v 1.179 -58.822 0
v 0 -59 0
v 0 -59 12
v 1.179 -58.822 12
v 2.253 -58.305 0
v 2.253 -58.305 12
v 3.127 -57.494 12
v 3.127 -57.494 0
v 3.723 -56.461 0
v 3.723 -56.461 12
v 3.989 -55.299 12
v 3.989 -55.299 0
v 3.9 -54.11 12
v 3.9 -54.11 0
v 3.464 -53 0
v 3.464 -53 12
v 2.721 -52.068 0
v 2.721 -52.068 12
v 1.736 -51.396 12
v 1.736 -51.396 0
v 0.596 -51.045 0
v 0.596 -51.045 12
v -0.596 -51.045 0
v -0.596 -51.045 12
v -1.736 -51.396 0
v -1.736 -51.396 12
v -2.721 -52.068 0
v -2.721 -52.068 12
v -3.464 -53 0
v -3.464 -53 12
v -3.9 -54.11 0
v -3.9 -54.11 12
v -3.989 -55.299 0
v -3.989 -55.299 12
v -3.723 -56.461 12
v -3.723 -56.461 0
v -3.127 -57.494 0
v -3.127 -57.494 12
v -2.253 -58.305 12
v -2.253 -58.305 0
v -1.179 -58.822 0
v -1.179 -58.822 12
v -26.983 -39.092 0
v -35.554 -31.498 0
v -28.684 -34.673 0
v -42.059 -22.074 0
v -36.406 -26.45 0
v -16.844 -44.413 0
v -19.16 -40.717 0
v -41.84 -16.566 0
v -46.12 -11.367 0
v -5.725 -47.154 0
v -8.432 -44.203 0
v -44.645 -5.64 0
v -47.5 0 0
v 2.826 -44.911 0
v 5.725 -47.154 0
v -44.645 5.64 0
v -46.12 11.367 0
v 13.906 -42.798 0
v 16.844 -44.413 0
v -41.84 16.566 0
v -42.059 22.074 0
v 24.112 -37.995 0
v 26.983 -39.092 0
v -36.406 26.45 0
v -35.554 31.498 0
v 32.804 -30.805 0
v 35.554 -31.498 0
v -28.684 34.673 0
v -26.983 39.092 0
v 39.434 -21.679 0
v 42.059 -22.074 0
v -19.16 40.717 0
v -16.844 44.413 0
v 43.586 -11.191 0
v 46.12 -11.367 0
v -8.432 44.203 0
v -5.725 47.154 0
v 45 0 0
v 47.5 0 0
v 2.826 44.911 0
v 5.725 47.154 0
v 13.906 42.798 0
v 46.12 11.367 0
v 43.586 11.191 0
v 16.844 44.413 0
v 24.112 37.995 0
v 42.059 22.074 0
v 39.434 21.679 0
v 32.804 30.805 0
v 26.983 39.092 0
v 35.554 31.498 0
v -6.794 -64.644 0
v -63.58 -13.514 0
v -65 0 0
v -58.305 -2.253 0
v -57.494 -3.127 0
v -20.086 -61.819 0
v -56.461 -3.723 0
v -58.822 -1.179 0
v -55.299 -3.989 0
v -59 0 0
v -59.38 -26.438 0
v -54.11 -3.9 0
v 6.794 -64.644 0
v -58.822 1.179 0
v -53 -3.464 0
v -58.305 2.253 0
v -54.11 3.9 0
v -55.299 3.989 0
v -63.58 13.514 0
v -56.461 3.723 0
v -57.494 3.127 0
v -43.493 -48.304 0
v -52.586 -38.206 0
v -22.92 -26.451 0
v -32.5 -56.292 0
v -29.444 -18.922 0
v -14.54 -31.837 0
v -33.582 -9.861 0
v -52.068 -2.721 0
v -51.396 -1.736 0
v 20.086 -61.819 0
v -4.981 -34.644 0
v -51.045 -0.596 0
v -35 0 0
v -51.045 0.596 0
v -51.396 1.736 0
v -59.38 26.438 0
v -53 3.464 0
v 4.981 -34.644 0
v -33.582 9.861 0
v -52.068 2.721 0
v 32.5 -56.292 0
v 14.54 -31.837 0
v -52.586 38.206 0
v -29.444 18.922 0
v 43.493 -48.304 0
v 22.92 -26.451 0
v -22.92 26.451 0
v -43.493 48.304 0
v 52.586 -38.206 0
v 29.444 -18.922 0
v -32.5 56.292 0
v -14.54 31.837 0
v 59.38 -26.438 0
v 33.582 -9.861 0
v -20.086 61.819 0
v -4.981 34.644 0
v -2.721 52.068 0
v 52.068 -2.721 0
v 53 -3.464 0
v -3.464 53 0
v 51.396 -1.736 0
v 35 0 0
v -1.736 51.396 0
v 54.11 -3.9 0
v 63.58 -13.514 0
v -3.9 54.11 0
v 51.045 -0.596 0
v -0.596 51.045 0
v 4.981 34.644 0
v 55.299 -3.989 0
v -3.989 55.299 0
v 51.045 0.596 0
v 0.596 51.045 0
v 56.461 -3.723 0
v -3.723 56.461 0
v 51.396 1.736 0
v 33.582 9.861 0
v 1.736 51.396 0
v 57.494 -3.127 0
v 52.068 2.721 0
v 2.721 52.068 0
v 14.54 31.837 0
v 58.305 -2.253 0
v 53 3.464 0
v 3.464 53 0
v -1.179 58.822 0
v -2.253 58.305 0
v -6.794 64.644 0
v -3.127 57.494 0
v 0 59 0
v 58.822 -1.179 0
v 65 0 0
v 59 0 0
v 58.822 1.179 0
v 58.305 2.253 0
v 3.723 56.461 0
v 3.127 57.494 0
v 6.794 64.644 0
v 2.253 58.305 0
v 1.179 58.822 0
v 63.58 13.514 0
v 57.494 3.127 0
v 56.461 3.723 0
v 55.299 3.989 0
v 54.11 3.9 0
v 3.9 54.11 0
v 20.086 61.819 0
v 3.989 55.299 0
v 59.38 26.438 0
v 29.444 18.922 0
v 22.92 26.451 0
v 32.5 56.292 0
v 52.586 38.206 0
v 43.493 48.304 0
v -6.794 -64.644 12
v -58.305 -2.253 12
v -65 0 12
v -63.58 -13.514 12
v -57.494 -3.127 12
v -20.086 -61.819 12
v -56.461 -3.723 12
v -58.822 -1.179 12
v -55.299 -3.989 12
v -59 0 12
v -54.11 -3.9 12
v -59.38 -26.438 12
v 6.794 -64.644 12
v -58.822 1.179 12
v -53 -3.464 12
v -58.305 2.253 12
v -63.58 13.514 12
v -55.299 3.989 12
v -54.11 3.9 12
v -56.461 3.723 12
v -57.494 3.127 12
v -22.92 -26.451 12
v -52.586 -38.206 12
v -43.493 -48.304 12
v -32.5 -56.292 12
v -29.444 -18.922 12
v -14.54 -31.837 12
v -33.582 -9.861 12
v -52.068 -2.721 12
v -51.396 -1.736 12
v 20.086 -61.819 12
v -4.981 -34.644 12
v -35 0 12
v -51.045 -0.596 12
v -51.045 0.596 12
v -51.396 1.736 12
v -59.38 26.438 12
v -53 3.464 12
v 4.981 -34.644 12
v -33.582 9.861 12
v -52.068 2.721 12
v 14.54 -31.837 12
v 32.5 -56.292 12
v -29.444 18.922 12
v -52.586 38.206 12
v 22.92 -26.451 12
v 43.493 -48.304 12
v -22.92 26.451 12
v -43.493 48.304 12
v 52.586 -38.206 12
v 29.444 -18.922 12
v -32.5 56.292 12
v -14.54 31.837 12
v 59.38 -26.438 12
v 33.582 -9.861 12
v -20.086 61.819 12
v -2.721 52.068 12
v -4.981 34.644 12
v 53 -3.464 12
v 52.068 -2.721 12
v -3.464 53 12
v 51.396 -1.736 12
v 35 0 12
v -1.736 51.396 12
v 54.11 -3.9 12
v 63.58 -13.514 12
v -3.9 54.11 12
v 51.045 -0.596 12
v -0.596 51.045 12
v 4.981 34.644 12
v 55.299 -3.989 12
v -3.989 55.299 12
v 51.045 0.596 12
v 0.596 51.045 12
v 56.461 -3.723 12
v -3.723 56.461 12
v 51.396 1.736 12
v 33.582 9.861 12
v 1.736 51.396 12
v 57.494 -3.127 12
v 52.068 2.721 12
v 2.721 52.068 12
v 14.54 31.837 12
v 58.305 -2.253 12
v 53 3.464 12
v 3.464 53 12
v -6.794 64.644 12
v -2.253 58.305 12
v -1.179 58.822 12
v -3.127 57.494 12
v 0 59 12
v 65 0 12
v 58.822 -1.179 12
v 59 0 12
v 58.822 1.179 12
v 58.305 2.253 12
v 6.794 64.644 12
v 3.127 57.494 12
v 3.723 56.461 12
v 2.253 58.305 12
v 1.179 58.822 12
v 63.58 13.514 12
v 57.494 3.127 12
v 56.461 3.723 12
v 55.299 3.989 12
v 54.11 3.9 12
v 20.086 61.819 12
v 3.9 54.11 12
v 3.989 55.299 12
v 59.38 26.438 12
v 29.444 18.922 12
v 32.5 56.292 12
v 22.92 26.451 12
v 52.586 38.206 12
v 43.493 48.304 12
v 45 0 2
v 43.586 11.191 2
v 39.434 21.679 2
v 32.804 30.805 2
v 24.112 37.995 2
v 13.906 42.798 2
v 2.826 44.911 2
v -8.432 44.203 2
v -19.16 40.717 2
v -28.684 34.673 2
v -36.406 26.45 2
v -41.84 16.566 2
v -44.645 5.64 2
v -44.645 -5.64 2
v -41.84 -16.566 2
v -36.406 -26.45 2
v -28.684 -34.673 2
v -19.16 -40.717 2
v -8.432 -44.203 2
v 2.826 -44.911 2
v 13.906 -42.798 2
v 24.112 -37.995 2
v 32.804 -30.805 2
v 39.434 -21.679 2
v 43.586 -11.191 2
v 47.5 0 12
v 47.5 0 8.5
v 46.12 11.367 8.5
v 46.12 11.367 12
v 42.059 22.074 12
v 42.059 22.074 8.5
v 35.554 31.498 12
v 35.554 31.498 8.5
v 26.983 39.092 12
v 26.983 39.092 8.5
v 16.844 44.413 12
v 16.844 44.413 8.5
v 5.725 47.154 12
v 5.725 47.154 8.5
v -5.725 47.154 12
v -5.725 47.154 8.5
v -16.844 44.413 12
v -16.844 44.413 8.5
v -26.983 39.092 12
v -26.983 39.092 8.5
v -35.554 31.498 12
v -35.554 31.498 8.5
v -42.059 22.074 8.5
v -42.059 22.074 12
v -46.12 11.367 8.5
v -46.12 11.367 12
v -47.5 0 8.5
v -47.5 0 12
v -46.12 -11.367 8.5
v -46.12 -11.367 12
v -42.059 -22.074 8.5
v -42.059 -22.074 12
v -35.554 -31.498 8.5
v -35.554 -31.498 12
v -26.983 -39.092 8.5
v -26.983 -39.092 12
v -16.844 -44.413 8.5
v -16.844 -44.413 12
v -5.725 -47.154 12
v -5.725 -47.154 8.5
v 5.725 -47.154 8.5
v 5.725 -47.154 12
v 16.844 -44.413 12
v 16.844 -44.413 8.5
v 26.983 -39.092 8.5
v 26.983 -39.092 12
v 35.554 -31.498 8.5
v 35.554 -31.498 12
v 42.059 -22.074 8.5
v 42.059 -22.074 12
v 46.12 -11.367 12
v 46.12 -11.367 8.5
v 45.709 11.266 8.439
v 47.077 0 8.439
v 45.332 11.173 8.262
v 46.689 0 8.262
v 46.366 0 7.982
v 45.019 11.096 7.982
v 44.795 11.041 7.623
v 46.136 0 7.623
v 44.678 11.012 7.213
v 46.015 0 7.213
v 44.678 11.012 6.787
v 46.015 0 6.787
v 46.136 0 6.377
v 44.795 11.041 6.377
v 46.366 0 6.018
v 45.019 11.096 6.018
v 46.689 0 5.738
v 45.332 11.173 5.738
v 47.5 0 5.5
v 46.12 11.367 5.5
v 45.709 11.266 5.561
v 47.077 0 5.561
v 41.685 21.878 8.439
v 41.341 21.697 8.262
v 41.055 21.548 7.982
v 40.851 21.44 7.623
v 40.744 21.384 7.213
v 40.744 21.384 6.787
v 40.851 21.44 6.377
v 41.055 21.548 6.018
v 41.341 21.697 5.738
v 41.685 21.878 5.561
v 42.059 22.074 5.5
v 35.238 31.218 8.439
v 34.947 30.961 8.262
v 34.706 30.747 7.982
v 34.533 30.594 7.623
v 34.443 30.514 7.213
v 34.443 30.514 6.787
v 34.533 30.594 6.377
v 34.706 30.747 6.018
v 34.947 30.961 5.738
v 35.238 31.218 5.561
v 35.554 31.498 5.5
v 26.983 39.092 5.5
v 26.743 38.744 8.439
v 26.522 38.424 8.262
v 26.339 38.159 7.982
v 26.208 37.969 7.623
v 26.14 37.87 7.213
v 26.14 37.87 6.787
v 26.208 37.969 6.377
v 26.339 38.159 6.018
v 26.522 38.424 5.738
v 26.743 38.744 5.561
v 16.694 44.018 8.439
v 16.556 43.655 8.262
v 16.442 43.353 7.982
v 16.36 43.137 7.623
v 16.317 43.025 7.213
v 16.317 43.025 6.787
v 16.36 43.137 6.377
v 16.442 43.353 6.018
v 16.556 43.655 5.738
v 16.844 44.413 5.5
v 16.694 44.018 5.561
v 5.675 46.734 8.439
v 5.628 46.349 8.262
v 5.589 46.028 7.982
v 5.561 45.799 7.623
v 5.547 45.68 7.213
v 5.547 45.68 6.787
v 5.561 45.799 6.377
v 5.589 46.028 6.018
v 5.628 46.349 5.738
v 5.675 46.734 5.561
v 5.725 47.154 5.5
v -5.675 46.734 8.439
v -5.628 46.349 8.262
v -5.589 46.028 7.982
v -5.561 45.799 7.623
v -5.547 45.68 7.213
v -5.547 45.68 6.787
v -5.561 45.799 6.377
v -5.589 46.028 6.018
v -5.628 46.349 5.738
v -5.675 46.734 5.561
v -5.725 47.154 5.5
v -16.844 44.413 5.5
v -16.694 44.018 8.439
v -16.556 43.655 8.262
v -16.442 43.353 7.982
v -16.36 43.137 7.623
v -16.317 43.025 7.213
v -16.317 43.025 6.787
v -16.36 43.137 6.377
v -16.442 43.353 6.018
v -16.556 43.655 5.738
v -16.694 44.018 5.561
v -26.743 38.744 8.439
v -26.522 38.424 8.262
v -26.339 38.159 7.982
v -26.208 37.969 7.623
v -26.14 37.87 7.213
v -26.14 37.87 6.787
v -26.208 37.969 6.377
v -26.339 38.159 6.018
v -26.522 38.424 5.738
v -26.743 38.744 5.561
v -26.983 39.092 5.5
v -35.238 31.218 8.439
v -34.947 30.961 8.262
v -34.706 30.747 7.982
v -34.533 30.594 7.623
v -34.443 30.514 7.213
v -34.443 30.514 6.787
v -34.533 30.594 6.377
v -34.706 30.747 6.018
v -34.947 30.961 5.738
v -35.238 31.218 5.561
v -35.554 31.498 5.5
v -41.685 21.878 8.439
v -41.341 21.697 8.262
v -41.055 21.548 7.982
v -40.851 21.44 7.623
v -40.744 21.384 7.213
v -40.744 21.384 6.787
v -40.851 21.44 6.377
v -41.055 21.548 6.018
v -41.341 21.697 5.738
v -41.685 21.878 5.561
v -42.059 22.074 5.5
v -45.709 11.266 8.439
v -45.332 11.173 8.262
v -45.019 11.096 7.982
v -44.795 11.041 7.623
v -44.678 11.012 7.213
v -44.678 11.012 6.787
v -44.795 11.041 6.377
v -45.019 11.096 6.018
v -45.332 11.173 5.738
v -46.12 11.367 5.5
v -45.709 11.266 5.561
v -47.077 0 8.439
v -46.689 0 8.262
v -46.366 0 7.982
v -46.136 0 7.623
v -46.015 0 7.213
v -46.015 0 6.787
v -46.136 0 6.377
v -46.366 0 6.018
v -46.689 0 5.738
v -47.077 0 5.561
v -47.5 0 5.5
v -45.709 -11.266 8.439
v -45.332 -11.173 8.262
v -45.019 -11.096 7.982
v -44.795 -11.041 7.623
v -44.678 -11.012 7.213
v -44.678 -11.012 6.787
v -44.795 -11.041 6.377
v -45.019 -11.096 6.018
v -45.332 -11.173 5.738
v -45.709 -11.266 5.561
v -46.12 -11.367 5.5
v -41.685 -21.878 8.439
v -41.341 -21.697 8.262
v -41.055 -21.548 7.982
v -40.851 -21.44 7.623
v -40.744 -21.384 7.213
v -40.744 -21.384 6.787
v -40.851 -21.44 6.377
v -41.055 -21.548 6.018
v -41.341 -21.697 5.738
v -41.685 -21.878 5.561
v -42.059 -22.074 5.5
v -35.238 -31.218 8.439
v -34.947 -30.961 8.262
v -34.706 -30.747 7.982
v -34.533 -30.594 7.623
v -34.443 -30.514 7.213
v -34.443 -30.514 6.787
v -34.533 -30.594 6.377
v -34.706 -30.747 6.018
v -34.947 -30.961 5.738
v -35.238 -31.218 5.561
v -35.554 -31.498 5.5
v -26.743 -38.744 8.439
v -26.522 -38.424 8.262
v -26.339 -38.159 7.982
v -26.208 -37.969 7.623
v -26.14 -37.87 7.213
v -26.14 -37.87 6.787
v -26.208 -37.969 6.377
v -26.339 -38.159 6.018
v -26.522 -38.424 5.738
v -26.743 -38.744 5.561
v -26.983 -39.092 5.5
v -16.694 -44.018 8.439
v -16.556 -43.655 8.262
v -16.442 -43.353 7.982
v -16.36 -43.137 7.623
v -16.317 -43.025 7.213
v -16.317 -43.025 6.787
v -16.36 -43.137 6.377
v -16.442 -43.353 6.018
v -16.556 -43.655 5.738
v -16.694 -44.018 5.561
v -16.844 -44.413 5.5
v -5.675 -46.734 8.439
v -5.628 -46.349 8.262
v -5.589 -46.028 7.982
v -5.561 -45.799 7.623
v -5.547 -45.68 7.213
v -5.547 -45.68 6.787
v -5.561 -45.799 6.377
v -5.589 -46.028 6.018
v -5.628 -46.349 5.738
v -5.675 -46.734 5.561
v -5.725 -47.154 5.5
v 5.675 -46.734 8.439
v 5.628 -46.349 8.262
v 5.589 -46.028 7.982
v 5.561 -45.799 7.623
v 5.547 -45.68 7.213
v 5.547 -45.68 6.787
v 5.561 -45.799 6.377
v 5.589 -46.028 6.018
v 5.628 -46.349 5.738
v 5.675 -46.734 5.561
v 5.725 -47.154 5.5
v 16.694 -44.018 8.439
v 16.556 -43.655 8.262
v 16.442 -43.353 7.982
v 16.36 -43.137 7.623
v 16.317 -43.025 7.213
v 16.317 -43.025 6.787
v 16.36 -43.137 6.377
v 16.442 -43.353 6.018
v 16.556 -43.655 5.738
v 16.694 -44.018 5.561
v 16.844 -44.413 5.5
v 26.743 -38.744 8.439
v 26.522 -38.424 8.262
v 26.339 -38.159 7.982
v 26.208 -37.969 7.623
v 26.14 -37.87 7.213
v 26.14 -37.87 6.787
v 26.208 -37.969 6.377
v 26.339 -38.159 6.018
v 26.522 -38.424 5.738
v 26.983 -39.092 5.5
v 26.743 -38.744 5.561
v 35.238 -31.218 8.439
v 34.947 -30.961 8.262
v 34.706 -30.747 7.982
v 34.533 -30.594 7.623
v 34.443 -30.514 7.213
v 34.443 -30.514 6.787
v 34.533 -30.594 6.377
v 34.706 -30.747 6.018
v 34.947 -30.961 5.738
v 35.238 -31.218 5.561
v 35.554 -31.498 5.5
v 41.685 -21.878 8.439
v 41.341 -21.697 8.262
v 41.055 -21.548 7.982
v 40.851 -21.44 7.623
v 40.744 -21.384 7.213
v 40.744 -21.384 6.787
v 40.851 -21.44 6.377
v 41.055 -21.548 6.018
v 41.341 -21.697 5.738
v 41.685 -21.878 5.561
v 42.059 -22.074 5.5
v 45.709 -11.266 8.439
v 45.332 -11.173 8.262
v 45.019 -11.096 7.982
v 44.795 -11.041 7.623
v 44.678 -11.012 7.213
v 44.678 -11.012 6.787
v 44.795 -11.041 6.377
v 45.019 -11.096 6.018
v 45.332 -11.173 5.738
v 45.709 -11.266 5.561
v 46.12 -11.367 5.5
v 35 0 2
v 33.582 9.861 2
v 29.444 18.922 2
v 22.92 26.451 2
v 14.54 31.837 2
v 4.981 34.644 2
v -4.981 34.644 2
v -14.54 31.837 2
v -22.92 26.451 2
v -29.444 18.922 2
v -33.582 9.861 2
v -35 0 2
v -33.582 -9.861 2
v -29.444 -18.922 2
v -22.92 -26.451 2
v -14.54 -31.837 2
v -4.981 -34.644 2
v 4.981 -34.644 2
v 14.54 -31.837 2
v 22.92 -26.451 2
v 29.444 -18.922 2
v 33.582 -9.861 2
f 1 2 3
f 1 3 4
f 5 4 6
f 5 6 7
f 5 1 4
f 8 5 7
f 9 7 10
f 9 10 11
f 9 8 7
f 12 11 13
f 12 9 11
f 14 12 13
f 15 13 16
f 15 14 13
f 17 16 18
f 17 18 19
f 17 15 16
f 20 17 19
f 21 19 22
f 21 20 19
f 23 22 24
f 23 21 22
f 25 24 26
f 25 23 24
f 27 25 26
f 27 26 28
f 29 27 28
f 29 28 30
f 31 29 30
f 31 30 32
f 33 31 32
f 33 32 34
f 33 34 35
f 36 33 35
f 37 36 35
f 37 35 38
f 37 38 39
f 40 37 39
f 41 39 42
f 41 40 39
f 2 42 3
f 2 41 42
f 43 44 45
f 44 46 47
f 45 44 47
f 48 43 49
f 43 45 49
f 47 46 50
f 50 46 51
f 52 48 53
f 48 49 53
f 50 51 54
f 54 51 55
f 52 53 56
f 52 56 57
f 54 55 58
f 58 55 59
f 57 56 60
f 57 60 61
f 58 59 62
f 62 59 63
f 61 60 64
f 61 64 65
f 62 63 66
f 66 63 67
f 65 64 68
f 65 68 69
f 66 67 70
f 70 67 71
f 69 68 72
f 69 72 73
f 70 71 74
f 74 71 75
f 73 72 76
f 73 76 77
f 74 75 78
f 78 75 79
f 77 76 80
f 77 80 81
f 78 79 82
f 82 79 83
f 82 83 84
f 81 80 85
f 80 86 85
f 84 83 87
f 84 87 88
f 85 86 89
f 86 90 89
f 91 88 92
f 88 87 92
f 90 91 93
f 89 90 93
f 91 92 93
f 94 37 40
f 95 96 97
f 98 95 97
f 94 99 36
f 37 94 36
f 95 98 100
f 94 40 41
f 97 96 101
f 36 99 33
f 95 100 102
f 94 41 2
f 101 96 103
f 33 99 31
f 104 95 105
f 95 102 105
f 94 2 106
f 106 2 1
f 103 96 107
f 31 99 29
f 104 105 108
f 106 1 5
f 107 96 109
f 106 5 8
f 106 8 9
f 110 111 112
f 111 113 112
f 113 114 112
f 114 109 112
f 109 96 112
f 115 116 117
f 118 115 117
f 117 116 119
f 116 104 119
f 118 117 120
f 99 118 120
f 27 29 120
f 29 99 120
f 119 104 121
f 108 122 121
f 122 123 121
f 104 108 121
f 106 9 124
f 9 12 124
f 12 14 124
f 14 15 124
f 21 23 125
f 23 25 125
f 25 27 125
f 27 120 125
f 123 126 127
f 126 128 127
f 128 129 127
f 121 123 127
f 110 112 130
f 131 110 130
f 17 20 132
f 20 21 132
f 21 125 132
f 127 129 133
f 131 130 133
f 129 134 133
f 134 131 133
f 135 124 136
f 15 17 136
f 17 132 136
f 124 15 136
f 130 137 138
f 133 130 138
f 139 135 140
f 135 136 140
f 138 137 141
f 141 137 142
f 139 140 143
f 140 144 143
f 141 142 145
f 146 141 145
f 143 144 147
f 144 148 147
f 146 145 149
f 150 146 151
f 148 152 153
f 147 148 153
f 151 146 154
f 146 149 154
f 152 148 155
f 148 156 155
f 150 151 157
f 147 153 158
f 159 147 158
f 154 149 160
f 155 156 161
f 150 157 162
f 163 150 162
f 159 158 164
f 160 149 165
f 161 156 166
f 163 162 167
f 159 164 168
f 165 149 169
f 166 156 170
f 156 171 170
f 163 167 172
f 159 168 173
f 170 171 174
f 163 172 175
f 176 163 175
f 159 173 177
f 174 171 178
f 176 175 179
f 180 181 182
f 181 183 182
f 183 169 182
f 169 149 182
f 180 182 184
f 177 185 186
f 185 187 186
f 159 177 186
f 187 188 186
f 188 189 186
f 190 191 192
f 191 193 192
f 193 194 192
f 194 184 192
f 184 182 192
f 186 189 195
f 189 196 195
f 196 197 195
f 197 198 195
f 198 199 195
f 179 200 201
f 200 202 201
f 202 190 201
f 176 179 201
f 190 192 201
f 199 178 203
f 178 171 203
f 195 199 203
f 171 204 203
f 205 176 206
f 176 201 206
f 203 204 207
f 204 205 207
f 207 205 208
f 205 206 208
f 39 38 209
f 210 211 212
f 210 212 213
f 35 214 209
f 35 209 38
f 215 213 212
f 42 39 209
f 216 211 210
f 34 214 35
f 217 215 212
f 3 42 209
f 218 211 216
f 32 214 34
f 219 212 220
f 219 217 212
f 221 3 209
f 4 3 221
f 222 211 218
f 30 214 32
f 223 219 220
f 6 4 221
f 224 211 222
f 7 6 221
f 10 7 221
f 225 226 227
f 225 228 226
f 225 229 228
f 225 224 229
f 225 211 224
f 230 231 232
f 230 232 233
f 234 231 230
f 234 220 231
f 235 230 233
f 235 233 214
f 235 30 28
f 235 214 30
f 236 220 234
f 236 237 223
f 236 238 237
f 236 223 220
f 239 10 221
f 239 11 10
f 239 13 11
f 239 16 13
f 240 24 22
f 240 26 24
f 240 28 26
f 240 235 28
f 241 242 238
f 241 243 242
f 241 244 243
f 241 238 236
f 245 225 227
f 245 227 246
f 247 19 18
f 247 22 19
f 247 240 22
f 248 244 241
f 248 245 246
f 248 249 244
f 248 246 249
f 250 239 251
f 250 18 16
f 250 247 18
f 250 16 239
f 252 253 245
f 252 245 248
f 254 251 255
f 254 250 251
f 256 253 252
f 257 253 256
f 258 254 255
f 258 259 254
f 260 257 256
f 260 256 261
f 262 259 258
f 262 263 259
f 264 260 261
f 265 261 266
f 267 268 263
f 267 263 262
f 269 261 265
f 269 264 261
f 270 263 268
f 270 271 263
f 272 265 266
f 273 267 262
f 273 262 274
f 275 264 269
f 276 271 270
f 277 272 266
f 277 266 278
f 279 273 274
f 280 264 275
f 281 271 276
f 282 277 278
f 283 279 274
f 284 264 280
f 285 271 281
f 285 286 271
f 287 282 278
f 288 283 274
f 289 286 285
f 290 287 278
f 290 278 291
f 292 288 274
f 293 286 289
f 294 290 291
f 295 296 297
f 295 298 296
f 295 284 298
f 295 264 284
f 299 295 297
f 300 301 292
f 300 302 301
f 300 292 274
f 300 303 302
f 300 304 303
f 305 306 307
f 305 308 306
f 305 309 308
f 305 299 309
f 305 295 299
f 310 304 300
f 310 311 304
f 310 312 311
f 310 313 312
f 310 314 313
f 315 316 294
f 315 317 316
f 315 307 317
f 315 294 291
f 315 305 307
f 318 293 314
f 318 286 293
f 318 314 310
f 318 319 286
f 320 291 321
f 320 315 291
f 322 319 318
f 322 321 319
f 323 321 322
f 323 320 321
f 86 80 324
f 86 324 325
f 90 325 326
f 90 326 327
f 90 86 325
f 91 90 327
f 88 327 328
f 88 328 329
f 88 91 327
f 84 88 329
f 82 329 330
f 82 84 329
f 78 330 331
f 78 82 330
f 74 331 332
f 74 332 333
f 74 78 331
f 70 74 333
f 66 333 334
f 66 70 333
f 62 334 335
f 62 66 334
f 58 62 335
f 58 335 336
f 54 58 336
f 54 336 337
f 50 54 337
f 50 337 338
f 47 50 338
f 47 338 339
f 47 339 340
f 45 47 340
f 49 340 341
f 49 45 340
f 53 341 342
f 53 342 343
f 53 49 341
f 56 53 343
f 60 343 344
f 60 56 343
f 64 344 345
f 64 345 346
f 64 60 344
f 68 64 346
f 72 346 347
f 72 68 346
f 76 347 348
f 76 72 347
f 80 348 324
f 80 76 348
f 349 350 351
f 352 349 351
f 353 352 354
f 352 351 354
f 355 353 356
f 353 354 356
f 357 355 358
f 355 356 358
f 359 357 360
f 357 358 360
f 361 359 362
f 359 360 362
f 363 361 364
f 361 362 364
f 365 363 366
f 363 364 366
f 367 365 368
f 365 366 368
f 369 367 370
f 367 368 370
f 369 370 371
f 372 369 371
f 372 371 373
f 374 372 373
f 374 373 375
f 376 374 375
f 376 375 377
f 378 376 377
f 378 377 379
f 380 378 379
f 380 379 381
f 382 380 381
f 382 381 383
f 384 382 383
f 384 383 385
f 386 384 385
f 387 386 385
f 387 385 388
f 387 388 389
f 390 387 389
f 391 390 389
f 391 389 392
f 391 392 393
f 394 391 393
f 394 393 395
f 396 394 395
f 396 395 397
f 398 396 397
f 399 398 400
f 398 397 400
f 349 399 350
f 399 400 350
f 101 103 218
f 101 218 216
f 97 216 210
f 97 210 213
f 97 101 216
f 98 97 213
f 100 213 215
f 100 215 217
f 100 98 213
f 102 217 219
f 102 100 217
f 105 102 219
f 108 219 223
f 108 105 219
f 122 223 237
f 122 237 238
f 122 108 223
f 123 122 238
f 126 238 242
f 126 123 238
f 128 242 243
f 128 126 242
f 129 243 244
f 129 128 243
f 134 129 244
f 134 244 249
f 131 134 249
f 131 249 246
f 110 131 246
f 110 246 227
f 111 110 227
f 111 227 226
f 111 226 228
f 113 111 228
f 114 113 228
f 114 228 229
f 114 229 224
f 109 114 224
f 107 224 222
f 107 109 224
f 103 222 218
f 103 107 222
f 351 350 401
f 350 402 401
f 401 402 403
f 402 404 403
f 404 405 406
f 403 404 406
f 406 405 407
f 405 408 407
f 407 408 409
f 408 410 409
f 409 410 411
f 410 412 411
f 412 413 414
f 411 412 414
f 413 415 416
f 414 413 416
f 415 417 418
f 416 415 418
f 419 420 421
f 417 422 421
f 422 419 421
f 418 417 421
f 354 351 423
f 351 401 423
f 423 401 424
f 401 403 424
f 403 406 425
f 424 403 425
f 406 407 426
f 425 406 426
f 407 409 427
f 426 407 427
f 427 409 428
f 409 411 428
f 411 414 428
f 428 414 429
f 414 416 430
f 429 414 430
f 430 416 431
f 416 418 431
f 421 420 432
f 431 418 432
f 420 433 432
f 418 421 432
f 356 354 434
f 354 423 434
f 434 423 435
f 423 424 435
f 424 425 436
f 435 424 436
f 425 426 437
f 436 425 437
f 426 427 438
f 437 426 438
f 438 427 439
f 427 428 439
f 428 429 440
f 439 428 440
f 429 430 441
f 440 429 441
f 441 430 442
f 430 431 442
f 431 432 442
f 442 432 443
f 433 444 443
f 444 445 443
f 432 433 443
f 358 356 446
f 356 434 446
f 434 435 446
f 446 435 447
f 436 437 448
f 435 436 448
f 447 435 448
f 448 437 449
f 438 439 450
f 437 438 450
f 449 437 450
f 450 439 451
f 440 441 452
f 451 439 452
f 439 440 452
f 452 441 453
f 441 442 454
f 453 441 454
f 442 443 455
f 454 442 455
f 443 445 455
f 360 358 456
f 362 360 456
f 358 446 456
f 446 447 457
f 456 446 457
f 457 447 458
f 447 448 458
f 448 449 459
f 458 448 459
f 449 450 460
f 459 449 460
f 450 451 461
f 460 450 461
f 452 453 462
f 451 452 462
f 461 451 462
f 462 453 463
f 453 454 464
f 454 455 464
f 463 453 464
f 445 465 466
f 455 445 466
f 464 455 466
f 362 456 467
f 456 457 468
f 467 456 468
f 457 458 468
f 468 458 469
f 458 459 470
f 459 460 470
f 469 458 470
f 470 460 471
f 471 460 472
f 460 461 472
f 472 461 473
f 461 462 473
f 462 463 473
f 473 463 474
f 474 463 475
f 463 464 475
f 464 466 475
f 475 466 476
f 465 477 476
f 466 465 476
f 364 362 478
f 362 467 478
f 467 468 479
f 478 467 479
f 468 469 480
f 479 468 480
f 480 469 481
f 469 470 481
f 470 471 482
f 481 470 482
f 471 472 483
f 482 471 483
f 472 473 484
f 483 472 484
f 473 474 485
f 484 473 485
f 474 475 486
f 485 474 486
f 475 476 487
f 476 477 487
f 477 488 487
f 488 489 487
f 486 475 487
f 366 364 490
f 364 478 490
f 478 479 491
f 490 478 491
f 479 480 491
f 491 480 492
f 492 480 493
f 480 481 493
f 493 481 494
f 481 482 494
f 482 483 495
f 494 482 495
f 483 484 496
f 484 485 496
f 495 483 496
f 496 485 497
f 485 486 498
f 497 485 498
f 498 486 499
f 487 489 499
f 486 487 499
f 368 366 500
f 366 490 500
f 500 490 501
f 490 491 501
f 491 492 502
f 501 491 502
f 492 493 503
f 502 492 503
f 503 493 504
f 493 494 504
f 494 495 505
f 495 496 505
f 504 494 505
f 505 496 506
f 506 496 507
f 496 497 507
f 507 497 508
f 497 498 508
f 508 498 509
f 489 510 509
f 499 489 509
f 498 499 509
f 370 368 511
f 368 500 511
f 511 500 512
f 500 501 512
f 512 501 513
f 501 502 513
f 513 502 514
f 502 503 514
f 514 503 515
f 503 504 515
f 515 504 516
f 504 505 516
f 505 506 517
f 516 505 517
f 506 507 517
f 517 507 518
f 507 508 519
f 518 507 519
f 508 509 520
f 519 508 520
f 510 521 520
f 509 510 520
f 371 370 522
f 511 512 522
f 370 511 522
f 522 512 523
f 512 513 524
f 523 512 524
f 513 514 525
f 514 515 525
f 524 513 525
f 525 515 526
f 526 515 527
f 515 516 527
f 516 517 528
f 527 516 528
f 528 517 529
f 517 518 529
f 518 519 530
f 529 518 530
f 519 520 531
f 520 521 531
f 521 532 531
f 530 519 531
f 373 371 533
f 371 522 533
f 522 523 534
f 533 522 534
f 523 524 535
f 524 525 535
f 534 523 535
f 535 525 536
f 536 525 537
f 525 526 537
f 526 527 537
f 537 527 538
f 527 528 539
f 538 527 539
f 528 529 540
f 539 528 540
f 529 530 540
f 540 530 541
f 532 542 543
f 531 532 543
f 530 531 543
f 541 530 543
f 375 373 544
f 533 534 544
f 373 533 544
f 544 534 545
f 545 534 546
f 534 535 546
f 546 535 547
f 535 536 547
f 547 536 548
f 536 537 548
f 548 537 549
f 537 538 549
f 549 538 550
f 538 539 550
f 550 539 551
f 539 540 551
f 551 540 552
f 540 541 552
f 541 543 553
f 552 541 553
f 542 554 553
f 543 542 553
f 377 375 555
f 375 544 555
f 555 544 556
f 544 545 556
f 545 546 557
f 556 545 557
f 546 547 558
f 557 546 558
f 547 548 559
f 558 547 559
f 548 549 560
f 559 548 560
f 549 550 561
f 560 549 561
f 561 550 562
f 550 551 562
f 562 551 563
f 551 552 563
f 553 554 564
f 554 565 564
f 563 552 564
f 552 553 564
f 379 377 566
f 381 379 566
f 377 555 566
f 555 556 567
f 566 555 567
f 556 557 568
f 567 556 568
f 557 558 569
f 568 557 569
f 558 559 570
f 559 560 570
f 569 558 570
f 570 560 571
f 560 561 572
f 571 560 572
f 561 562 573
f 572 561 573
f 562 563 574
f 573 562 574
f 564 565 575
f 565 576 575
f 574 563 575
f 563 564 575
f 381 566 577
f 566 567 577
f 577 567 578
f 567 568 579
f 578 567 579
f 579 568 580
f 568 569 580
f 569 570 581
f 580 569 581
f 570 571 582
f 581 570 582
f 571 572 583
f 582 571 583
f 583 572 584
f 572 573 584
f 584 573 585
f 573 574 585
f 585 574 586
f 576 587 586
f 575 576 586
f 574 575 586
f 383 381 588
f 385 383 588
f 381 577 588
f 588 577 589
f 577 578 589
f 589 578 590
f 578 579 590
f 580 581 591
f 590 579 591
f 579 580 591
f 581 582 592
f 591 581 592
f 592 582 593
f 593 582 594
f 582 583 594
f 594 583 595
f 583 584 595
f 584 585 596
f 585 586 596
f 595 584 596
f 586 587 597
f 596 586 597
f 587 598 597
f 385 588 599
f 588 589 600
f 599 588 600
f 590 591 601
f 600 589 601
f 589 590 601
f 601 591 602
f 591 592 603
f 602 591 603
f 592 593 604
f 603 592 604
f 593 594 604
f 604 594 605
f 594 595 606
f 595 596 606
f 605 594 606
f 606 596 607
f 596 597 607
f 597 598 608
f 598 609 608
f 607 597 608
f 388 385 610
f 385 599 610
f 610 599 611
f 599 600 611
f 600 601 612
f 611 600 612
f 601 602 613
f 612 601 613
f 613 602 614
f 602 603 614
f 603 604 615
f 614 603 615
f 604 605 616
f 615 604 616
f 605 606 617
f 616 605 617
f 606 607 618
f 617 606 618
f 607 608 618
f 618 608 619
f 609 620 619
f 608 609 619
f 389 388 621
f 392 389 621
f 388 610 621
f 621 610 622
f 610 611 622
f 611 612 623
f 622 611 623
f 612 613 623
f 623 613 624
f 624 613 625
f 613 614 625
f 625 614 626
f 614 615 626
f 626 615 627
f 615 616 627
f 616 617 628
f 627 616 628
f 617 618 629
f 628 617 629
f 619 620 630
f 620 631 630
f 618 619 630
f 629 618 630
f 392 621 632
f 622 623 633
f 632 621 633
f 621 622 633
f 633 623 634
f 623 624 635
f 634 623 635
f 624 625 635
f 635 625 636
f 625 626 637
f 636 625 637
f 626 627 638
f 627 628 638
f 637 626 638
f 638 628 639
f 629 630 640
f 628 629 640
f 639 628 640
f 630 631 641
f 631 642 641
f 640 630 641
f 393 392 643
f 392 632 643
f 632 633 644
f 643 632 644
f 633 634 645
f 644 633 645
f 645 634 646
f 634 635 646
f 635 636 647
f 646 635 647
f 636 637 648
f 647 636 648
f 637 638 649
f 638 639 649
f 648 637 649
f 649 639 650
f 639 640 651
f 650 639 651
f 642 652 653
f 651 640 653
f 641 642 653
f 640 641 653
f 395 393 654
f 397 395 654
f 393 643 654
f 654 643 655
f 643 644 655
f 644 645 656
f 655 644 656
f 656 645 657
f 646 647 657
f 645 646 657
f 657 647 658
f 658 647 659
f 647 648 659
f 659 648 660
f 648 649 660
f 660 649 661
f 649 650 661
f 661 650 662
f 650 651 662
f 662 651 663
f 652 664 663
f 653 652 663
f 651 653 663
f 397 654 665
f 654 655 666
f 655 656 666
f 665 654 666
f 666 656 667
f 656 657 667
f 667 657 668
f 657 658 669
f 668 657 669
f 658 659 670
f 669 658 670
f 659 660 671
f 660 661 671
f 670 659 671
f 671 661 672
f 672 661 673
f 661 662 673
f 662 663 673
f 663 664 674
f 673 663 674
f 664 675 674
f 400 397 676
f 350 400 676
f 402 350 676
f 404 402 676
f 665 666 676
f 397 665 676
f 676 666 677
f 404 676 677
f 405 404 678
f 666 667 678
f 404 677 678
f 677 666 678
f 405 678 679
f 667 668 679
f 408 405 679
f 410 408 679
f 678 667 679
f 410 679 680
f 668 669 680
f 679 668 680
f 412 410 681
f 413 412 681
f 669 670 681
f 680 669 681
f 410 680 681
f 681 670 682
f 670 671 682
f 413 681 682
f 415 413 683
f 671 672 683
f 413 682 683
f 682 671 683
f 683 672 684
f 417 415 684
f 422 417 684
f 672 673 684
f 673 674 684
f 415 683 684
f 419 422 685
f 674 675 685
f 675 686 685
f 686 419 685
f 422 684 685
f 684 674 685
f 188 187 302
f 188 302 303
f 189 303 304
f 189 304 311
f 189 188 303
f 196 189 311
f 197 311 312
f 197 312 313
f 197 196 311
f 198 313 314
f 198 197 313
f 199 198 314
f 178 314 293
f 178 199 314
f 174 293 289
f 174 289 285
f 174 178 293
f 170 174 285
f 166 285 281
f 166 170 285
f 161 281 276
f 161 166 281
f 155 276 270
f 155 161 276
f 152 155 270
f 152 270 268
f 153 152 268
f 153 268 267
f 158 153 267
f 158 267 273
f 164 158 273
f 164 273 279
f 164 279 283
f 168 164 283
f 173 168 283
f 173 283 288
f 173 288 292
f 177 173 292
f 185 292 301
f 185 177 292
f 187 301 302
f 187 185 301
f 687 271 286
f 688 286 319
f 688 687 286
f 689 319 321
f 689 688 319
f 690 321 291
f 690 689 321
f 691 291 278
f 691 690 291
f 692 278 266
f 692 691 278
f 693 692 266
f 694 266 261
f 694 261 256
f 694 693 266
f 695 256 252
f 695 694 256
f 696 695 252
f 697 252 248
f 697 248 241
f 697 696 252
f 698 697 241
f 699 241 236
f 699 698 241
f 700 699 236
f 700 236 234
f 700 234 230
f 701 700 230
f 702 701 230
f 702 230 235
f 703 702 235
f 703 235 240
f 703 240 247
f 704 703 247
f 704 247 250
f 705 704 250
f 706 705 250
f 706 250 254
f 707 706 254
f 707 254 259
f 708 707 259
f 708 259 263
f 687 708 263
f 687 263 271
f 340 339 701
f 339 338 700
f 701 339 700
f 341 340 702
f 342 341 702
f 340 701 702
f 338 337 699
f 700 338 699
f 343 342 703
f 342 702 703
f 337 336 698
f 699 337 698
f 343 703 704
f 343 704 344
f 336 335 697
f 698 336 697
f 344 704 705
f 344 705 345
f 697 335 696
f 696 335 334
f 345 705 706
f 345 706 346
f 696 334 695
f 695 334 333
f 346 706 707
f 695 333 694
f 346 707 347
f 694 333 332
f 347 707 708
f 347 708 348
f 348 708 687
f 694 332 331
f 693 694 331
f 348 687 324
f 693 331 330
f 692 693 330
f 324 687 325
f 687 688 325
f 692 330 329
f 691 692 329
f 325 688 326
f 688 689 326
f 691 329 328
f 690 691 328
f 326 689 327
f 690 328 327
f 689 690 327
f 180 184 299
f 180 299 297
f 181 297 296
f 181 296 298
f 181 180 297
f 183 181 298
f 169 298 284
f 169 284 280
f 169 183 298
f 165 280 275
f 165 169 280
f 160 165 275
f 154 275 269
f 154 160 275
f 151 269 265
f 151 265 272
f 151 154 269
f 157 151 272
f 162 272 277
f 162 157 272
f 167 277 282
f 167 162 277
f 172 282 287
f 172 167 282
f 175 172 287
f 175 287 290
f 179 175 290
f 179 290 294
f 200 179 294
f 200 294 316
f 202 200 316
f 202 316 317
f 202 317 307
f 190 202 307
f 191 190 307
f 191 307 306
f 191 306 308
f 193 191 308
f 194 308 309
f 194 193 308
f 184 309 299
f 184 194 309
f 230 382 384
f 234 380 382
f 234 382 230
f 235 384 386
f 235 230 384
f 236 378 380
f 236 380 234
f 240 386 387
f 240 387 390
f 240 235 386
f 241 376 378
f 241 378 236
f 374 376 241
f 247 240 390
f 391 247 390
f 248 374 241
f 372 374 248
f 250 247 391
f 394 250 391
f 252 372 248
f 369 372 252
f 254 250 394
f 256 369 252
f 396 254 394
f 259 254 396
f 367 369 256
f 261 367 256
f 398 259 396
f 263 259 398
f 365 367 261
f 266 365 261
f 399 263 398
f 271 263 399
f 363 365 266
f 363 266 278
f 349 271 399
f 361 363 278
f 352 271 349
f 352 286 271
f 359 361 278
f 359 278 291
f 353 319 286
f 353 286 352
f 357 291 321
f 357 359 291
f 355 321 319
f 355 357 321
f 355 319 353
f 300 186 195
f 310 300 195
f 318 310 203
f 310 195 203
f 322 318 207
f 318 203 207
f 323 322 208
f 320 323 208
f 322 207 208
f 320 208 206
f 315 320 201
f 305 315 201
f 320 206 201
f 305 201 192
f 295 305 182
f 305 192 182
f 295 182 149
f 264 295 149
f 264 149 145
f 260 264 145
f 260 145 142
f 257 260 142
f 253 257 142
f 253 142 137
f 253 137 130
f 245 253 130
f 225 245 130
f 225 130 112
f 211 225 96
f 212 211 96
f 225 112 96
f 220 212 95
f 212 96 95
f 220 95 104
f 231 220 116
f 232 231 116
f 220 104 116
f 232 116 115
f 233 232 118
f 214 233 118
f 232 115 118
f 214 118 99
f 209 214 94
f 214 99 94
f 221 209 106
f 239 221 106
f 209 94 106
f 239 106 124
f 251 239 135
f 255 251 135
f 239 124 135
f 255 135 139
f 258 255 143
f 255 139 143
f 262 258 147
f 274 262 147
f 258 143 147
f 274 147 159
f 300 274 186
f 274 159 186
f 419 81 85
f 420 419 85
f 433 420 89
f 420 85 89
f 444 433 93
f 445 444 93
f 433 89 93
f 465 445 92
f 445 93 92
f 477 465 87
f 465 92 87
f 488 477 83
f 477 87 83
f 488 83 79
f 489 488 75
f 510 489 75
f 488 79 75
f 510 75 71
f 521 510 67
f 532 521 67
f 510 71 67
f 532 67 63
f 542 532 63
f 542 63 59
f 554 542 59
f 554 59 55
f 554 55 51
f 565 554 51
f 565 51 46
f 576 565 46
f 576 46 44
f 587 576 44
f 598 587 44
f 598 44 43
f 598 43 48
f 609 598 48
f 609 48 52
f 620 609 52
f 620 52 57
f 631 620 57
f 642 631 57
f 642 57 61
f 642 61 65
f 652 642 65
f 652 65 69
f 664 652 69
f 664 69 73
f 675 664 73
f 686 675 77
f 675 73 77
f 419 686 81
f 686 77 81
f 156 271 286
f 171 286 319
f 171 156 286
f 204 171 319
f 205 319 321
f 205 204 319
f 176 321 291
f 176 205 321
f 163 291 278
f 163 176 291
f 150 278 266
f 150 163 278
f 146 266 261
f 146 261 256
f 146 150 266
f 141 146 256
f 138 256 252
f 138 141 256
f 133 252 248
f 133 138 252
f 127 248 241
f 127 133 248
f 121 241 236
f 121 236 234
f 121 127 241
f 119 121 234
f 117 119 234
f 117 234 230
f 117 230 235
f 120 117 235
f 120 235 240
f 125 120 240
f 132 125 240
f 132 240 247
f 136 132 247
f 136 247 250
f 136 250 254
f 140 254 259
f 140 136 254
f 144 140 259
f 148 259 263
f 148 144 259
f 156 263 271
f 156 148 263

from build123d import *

# Parameters (mm, degrees)
CYLINDER002_R     = 4
CYLINDER002_DEPTH = 12
ARRAY_COUNT       = 4
CYLINDER001_R     = 35
CYLINDER001_DEPTH = 12
CYLINDER_R        = 65
CYLINDER_DEPTH    = 12
TORUS_R           = 1.5
CYLINDER005_R     = 45
CYLINDER005_DEPTH = 2
CYLINDER004_R     = 35
CYLINDER004_DEPTH = 12
CYLINDER003_R     = 47.5
CYLINDER003_DEPTH = 12


with BuildPart() as array:
    # Cylinder002 → Cylinder002 (new body)
    with BuildSketch(Plane(origin=(55, 0, 0), x_dir=(1, 0, 0), z_dir=(0, 0, 1))):
        Circle(CYLINDER002_R)
    extrude(amount=CYLINDER002_DEPTH)

    # Array: Array ×4 about axis
    array_axis = Axis((0, 0, 0), (0, 0, 1))


with BuildPart() as array_1:
    add(array.part)
    for i in range(1, ARRAY_COUNT):
        add(array.part.rotate(array_axis, i * 360 / ARRAY_COUNT))


with BuildPart() as cylinder001:
    # Cylinder001 → Cylinder001 (new body)
    with BuildSketch(Plane.XY):
        Circle(CYLINDER001_R)
    extrude(amount=CYLINDER001_DEPTH)


with BuildPart() as boltedflange:
    # Cylinder → Cylinder (new body)
    with BuildSketch(Plane.XY):
        Circle(CYLINDER_R)
    extrude(amount=CYLINDER_DEPTH)

    # Cut: cut Cylinder001
    add(cylinder001.part, mode=Mode.SUBTRACT)

    # Cut001: cut Array
    add(array_1.part, mode=Mode.SUBTRACT)


with BuildPart() as torus:
    # Torus → Torus (revolve)
    with BuildSketch(Plane(origin=(0, 0, 7), x_dir=(1, 0, 0), z_dir=(0, -1, 0))):
        with Locations((47.5, 0)):
            Circle(TORUS_R)
    revolve(axis=Axis((0, 0, 7), (0, 0, 1)))


with BuildPart() as cylinder005:
    # Cylinder005 → Cylinder005 (new body)
    with BuildSketch(Plane.XY):
        Circle(CYLINDER005_R)
    extrude(amount=CYLINDER005_DEPTH)


with BuildPart() as fusion:
    # Cylinder004 → Cylinder004 (new body)
    with BuildSketch(Plane.XY):
        Circle(CYLINDER004_R)
    extrude(amount=CYLINDER004_DEPTH)

    # Fusion: union Cylinder005
    add(cylinder005.part)


with BuildPart() as collarforclampedorrotational:
    # Cylinder003 → Cylinder003 (new body)
    with BuildSketch(Plane.XY):
        Circle(CYLINDER003_R)
    extrude(amount=CYLINDER003_DEPTH)

    # Cut002: cut Fusion
    add(fusion.part, mode=Mode.SUBTRACT)

    # Cut003: cut Torus
    add(torus.part, mode=Mode.SUBTRACT)


solid = Compound([boltedflange.part, collarforclampedorrotational.part])
